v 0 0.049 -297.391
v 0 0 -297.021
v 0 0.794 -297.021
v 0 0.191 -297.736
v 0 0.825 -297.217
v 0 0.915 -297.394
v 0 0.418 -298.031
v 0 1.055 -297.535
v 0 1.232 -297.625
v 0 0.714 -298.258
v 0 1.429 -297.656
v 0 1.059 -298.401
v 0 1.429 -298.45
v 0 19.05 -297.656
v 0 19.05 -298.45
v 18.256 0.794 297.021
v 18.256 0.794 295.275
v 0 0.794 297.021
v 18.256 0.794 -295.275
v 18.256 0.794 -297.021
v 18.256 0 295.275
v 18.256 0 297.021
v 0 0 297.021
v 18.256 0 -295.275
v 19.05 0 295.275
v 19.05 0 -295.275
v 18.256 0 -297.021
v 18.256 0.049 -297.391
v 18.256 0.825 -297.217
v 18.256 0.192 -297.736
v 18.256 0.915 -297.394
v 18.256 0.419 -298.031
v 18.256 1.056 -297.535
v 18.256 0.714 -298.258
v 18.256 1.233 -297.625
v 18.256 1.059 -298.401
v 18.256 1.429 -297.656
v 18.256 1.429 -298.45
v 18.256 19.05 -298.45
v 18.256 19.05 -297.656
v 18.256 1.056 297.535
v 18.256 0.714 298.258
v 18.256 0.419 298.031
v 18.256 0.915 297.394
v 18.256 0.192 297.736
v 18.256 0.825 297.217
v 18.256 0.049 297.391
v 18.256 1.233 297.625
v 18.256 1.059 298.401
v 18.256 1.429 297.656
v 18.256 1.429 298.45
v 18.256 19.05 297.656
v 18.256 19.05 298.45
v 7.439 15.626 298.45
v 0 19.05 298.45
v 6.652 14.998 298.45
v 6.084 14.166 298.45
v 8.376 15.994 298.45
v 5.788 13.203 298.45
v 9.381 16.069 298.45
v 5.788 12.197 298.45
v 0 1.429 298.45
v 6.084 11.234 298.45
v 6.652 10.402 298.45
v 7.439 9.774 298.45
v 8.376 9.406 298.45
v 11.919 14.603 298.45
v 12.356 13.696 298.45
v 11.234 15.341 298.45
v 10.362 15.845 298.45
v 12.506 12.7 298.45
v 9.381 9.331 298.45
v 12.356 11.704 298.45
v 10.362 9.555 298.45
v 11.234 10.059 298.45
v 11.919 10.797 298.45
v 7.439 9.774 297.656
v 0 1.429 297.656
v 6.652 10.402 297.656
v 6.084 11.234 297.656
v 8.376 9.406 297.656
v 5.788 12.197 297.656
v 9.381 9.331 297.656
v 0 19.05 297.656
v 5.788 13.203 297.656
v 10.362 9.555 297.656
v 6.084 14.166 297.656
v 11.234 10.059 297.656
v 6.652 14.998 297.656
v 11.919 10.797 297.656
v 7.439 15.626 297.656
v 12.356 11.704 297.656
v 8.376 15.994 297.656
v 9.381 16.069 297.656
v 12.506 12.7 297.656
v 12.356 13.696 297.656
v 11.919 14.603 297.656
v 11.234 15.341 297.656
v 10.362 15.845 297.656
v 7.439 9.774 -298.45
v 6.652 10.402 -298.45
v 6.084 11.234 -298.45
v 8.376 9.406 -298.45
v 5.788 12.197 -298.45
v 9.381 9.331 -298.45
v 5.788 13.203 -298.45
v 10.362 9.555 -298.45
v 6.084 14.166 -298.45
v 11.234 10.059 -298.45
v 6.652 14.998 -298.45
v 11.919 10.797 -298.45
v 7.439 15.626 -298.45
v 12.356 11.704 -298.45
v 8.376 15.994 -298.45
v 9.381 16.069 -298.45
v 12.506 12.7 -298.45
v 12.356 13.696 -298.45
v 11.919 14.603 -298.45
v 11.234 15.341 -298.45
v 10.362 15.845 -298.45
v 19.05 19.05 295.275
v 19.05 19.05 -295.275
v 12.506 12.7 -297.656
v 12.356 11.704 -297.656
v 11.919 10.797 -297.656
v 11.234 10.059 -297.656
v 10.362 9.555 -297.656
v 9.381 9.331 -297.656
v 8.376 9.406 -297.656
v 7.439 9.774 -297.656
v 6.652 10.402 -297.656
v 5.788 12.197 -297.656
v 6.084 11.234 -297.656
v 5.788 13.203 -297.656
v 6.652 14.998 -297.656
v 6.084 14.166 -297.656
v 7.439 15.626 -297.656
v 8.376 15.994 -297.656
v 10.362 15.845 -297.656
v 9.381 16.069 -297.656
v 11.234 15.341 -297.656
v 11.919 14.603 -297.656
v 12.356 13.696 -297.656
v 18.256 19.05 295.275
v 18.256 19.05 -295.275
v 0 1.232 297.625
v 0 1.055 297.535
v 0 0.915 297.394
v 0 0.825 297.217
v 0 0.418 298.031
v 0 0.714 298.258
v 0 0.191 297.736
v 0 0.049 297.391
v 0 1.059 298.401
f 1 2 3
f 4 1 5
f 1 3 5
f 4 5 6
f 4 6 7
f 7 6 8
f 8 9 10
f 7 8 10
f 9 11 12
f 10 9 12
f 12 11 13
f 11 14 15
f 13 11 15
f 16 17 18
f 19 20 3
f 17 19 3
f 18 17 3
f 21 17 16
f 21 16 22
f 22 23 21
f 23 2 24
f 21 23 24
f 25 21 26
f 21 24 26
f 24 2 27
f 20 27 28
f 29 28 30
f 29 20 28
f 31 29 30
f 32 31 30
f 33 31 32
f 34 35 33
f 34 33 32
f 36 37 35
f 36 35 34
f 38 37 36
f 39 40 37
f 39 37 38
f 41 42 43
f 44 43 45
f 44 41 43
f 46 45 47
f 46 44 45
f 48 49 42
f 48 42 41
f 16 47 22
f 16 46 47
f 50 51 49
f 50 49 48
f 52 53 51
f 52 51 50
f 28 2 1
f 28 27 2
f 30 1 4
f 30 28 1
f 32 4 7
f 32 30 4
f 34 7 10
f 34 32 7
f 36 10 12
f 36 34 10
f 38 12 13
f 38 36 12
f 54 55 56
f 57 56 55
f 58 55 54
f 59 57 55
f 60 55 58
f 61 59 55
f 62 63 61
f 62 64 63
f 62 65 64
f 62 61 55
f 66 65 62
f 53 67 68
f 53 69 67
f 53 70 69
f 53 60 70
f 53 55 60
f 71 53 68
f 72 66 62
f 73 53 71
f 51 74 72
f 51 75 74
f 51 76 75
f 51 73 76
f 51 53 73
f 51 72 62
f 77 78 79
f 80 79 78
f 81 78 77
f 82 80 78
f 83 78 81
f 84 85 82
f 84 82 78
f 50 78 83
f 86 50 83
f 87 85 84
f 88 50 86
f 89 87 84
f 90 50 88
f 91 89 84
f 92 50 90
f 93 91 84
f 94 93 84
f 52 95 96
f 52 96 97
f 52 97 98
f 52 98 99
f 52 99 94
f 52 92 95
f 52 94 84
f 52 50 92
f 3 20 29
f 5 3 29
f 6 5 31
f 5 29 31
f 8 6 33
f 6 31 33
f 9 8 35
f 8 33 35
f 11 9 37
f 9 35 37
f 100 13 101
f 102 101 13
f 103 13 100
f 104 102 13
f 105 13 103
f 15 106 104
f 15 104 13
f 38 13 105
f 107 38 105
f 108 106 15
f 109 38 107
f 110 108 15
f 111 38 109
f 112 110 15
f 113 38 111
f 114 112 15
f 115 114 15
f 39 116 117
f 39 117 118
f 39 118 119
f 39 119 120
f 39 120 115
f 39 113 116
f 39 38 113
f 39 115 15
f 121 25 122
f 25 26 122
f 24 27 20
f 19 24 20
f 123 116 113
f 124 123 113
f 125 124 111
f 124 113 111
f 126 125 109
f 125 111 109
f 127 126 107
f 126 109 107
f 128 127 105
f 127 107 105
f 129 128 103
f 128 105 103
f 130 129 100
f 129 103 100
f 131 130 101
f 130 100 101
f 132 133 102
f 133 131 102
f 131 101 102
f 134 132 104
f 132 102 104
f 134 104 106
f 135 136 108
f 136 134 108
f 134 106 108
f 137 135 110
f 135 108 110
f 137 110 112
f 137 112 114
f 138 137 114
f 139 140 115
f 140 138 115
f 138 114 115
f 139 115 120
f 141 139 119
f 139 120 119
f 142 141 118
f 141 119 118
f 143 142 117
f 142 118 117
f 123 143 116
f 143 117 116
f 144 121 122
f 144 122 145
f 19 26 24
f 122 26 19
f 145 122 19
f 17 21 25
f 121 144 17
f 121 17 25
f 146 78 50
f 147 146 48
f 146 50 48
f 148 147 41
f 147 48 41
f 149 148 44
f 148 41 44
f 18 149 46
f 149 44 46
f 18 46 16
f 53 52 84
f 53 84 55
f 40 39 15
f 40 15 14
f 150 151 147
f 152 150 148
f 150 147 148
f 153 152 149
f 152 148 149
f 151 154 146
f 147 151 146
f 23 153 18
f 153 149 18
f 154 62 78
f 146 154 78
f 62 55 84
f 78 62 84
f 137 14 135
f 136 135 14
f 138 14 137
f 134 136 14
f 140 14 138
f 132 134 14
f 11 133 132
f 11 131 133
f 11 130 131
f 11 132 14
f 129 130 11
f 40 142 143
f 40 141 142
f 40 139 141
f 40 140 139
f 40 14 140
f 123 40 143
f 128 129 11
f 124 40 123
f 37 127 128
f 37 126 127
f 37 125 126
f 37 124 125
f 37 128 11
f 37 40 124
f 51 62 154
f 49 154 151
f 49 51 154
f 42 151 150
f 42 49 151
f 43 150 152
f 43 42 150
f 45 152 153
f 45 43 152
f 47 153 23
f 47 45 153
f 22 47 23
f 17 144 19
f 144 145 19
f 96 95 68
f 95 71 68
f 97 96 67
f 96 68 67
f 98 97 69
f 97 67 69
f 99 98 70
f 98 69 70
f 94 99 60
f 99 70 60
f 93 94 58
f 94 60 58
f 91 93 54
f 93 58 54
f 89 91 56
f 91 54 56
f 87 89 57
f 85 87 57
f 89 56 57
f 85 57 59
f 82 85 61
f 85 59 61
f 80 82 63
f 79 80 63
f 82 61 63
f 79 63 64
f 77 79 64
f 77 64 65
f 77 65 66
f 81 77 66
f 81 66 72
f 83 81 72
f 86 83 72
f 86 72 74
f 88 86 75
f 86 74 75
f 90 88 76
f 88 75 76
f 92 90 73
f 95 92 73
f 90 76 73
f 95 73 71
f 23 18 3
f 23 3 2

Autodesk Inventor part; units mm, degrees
ref_plane "YZ Plane" through (0, 0, 0) normal (1, 0, 0) x (0, 1, 0)
ref_plane "XZ Plane" through (0, 0, 0) normal (0, 1, 0) x (-1, 0, 0)
ref_plane "XY Plane" through (0, 0, 0) normal (0, 0, 1) x (1, 0, 0)
sketch "Sketch1" plane through (0, 0, 0) normal (0, 0, 1) x (1, 0, 0)
  line L0 (0, 0) -> (19.05, 0)
  line L1 (19.05, 0) -> (19.05, 19.05)
  line L2 (19.05, 19.05) -> (18.2563, 19.05)
  line L3 (18.2563, 19.05) -> (18.2563, 0.7938)
  line L4 (18.2563, 0.7938) -> (0, 0.7937)
  line L5 (0, 0.7937) -> (0, 0)
  dimension "d0" = 19.05
  dimension "d1" = 19.05
  dimension "d2" = 0.7937
extrude "Extrusion1" add sketch "Sketch1" along normal blind 298.45
sketch "Sketch2" plane through (0, 0, 298.45) normal (0, 0, 1) x (1, 0, 0)
  line L0 (0, 0) -> (19.05, 0) projected
  line L1 (19.05, 0) -> (19.05, 19.05) projected
  line L2 (19.05, 19.05) -> (18.2563, 19.05) projected
  line L3 (18.2563, 19.05) -> (18.2563, 0.7938) projected
  line L4 (18.2563, 0.7938) -> (18.2563, 0)
extrude "Extrusion2" cut sketch "Sketch2" against normal blind 3.175
sketch "Sketch3" plane through (18.2563, 0, 297.6562) normal (0, 0, 1) x (1, 0, 0)
  line L0 (-18.2563, 0) -> (0, 0)
  line L1 (0, 0) -> (0, 19.05)
  line L2 (0, 19.05) -> (-18.2563, 19.05)
  line L3 (-18.2563, 19.05) -> (-18.2563, 0)
edge flange "Flange1" height 19.05 angle 90 thickness 0.7937 bend radius 0.635 thickness toward (0, 0, 1) relief straight relief width 0.7937 relief depth 0.3969 edges at (9.1281, 0.7938, 298.45) wall of the first edge with corners at (0, 0, 297.6562) (18.2563, 0, 297.6562) (18.2562, 19.05, 297.6562) (0, 19.05, 297.6562)
bend "Bend1"
corner "Corner1"
sketch "Sketch4" plane through (0, 19.05, 298.45) normal (0, 0, 1) x (1, 0, 0)
  line L0 (18.2563, 0) -> (18.2563, -17.6213) projected
  line L1 (0, -17.6213) -> (0, 0) projected
  line L2 (0, -6.35) -> (18.2563, -6.35) construction
  circle A0 centre (9.1281, -6.35) radius 3.3782
  point P0 (0, -19.05)
  dimension "d17" = 12.7
  dimension "d18" = 6.7564
extrude "Extrusion3" cut sketch "Sketch4" against normal through all
mirror "Mirror1" about plane through (13.8989, 5.1511, 0) normal (0, 0, -1)
equation "\"d7\" = BendReliefWidth"
equation "\"d8\" = BendReliefDepth"
equation "\"d9\" = MinimumRemnant"
equation "\"d10\" = BendRadius"
equation "\"d14\" = CornerReliefSize"
equation "\"d15\" = GapSize"
equation "\"d16\" = JacobiRadiusSize"
equation "\"BendRadius\" = Thickness"
equation "\"BendReliefWidth\" = Thickness"
equation "\"BendReliefDepth\" = 0.5 * Thickness"
equation "\"CornerReliefSize\" = 4 * Thickness"
equation "\"MinimumRemnant\" = 2 * Thickness"
equation "\"TransitionRadius\" = BendRadius"
equation "\"JacobiRadiusSize\" = Thickness"
equation "\"GapSize\" = Thickness"
equation "\"Thickness\" = 0.79375"
properties part number "Chassis Back Electronics Protector Bar" material "Aluminum 6061"
